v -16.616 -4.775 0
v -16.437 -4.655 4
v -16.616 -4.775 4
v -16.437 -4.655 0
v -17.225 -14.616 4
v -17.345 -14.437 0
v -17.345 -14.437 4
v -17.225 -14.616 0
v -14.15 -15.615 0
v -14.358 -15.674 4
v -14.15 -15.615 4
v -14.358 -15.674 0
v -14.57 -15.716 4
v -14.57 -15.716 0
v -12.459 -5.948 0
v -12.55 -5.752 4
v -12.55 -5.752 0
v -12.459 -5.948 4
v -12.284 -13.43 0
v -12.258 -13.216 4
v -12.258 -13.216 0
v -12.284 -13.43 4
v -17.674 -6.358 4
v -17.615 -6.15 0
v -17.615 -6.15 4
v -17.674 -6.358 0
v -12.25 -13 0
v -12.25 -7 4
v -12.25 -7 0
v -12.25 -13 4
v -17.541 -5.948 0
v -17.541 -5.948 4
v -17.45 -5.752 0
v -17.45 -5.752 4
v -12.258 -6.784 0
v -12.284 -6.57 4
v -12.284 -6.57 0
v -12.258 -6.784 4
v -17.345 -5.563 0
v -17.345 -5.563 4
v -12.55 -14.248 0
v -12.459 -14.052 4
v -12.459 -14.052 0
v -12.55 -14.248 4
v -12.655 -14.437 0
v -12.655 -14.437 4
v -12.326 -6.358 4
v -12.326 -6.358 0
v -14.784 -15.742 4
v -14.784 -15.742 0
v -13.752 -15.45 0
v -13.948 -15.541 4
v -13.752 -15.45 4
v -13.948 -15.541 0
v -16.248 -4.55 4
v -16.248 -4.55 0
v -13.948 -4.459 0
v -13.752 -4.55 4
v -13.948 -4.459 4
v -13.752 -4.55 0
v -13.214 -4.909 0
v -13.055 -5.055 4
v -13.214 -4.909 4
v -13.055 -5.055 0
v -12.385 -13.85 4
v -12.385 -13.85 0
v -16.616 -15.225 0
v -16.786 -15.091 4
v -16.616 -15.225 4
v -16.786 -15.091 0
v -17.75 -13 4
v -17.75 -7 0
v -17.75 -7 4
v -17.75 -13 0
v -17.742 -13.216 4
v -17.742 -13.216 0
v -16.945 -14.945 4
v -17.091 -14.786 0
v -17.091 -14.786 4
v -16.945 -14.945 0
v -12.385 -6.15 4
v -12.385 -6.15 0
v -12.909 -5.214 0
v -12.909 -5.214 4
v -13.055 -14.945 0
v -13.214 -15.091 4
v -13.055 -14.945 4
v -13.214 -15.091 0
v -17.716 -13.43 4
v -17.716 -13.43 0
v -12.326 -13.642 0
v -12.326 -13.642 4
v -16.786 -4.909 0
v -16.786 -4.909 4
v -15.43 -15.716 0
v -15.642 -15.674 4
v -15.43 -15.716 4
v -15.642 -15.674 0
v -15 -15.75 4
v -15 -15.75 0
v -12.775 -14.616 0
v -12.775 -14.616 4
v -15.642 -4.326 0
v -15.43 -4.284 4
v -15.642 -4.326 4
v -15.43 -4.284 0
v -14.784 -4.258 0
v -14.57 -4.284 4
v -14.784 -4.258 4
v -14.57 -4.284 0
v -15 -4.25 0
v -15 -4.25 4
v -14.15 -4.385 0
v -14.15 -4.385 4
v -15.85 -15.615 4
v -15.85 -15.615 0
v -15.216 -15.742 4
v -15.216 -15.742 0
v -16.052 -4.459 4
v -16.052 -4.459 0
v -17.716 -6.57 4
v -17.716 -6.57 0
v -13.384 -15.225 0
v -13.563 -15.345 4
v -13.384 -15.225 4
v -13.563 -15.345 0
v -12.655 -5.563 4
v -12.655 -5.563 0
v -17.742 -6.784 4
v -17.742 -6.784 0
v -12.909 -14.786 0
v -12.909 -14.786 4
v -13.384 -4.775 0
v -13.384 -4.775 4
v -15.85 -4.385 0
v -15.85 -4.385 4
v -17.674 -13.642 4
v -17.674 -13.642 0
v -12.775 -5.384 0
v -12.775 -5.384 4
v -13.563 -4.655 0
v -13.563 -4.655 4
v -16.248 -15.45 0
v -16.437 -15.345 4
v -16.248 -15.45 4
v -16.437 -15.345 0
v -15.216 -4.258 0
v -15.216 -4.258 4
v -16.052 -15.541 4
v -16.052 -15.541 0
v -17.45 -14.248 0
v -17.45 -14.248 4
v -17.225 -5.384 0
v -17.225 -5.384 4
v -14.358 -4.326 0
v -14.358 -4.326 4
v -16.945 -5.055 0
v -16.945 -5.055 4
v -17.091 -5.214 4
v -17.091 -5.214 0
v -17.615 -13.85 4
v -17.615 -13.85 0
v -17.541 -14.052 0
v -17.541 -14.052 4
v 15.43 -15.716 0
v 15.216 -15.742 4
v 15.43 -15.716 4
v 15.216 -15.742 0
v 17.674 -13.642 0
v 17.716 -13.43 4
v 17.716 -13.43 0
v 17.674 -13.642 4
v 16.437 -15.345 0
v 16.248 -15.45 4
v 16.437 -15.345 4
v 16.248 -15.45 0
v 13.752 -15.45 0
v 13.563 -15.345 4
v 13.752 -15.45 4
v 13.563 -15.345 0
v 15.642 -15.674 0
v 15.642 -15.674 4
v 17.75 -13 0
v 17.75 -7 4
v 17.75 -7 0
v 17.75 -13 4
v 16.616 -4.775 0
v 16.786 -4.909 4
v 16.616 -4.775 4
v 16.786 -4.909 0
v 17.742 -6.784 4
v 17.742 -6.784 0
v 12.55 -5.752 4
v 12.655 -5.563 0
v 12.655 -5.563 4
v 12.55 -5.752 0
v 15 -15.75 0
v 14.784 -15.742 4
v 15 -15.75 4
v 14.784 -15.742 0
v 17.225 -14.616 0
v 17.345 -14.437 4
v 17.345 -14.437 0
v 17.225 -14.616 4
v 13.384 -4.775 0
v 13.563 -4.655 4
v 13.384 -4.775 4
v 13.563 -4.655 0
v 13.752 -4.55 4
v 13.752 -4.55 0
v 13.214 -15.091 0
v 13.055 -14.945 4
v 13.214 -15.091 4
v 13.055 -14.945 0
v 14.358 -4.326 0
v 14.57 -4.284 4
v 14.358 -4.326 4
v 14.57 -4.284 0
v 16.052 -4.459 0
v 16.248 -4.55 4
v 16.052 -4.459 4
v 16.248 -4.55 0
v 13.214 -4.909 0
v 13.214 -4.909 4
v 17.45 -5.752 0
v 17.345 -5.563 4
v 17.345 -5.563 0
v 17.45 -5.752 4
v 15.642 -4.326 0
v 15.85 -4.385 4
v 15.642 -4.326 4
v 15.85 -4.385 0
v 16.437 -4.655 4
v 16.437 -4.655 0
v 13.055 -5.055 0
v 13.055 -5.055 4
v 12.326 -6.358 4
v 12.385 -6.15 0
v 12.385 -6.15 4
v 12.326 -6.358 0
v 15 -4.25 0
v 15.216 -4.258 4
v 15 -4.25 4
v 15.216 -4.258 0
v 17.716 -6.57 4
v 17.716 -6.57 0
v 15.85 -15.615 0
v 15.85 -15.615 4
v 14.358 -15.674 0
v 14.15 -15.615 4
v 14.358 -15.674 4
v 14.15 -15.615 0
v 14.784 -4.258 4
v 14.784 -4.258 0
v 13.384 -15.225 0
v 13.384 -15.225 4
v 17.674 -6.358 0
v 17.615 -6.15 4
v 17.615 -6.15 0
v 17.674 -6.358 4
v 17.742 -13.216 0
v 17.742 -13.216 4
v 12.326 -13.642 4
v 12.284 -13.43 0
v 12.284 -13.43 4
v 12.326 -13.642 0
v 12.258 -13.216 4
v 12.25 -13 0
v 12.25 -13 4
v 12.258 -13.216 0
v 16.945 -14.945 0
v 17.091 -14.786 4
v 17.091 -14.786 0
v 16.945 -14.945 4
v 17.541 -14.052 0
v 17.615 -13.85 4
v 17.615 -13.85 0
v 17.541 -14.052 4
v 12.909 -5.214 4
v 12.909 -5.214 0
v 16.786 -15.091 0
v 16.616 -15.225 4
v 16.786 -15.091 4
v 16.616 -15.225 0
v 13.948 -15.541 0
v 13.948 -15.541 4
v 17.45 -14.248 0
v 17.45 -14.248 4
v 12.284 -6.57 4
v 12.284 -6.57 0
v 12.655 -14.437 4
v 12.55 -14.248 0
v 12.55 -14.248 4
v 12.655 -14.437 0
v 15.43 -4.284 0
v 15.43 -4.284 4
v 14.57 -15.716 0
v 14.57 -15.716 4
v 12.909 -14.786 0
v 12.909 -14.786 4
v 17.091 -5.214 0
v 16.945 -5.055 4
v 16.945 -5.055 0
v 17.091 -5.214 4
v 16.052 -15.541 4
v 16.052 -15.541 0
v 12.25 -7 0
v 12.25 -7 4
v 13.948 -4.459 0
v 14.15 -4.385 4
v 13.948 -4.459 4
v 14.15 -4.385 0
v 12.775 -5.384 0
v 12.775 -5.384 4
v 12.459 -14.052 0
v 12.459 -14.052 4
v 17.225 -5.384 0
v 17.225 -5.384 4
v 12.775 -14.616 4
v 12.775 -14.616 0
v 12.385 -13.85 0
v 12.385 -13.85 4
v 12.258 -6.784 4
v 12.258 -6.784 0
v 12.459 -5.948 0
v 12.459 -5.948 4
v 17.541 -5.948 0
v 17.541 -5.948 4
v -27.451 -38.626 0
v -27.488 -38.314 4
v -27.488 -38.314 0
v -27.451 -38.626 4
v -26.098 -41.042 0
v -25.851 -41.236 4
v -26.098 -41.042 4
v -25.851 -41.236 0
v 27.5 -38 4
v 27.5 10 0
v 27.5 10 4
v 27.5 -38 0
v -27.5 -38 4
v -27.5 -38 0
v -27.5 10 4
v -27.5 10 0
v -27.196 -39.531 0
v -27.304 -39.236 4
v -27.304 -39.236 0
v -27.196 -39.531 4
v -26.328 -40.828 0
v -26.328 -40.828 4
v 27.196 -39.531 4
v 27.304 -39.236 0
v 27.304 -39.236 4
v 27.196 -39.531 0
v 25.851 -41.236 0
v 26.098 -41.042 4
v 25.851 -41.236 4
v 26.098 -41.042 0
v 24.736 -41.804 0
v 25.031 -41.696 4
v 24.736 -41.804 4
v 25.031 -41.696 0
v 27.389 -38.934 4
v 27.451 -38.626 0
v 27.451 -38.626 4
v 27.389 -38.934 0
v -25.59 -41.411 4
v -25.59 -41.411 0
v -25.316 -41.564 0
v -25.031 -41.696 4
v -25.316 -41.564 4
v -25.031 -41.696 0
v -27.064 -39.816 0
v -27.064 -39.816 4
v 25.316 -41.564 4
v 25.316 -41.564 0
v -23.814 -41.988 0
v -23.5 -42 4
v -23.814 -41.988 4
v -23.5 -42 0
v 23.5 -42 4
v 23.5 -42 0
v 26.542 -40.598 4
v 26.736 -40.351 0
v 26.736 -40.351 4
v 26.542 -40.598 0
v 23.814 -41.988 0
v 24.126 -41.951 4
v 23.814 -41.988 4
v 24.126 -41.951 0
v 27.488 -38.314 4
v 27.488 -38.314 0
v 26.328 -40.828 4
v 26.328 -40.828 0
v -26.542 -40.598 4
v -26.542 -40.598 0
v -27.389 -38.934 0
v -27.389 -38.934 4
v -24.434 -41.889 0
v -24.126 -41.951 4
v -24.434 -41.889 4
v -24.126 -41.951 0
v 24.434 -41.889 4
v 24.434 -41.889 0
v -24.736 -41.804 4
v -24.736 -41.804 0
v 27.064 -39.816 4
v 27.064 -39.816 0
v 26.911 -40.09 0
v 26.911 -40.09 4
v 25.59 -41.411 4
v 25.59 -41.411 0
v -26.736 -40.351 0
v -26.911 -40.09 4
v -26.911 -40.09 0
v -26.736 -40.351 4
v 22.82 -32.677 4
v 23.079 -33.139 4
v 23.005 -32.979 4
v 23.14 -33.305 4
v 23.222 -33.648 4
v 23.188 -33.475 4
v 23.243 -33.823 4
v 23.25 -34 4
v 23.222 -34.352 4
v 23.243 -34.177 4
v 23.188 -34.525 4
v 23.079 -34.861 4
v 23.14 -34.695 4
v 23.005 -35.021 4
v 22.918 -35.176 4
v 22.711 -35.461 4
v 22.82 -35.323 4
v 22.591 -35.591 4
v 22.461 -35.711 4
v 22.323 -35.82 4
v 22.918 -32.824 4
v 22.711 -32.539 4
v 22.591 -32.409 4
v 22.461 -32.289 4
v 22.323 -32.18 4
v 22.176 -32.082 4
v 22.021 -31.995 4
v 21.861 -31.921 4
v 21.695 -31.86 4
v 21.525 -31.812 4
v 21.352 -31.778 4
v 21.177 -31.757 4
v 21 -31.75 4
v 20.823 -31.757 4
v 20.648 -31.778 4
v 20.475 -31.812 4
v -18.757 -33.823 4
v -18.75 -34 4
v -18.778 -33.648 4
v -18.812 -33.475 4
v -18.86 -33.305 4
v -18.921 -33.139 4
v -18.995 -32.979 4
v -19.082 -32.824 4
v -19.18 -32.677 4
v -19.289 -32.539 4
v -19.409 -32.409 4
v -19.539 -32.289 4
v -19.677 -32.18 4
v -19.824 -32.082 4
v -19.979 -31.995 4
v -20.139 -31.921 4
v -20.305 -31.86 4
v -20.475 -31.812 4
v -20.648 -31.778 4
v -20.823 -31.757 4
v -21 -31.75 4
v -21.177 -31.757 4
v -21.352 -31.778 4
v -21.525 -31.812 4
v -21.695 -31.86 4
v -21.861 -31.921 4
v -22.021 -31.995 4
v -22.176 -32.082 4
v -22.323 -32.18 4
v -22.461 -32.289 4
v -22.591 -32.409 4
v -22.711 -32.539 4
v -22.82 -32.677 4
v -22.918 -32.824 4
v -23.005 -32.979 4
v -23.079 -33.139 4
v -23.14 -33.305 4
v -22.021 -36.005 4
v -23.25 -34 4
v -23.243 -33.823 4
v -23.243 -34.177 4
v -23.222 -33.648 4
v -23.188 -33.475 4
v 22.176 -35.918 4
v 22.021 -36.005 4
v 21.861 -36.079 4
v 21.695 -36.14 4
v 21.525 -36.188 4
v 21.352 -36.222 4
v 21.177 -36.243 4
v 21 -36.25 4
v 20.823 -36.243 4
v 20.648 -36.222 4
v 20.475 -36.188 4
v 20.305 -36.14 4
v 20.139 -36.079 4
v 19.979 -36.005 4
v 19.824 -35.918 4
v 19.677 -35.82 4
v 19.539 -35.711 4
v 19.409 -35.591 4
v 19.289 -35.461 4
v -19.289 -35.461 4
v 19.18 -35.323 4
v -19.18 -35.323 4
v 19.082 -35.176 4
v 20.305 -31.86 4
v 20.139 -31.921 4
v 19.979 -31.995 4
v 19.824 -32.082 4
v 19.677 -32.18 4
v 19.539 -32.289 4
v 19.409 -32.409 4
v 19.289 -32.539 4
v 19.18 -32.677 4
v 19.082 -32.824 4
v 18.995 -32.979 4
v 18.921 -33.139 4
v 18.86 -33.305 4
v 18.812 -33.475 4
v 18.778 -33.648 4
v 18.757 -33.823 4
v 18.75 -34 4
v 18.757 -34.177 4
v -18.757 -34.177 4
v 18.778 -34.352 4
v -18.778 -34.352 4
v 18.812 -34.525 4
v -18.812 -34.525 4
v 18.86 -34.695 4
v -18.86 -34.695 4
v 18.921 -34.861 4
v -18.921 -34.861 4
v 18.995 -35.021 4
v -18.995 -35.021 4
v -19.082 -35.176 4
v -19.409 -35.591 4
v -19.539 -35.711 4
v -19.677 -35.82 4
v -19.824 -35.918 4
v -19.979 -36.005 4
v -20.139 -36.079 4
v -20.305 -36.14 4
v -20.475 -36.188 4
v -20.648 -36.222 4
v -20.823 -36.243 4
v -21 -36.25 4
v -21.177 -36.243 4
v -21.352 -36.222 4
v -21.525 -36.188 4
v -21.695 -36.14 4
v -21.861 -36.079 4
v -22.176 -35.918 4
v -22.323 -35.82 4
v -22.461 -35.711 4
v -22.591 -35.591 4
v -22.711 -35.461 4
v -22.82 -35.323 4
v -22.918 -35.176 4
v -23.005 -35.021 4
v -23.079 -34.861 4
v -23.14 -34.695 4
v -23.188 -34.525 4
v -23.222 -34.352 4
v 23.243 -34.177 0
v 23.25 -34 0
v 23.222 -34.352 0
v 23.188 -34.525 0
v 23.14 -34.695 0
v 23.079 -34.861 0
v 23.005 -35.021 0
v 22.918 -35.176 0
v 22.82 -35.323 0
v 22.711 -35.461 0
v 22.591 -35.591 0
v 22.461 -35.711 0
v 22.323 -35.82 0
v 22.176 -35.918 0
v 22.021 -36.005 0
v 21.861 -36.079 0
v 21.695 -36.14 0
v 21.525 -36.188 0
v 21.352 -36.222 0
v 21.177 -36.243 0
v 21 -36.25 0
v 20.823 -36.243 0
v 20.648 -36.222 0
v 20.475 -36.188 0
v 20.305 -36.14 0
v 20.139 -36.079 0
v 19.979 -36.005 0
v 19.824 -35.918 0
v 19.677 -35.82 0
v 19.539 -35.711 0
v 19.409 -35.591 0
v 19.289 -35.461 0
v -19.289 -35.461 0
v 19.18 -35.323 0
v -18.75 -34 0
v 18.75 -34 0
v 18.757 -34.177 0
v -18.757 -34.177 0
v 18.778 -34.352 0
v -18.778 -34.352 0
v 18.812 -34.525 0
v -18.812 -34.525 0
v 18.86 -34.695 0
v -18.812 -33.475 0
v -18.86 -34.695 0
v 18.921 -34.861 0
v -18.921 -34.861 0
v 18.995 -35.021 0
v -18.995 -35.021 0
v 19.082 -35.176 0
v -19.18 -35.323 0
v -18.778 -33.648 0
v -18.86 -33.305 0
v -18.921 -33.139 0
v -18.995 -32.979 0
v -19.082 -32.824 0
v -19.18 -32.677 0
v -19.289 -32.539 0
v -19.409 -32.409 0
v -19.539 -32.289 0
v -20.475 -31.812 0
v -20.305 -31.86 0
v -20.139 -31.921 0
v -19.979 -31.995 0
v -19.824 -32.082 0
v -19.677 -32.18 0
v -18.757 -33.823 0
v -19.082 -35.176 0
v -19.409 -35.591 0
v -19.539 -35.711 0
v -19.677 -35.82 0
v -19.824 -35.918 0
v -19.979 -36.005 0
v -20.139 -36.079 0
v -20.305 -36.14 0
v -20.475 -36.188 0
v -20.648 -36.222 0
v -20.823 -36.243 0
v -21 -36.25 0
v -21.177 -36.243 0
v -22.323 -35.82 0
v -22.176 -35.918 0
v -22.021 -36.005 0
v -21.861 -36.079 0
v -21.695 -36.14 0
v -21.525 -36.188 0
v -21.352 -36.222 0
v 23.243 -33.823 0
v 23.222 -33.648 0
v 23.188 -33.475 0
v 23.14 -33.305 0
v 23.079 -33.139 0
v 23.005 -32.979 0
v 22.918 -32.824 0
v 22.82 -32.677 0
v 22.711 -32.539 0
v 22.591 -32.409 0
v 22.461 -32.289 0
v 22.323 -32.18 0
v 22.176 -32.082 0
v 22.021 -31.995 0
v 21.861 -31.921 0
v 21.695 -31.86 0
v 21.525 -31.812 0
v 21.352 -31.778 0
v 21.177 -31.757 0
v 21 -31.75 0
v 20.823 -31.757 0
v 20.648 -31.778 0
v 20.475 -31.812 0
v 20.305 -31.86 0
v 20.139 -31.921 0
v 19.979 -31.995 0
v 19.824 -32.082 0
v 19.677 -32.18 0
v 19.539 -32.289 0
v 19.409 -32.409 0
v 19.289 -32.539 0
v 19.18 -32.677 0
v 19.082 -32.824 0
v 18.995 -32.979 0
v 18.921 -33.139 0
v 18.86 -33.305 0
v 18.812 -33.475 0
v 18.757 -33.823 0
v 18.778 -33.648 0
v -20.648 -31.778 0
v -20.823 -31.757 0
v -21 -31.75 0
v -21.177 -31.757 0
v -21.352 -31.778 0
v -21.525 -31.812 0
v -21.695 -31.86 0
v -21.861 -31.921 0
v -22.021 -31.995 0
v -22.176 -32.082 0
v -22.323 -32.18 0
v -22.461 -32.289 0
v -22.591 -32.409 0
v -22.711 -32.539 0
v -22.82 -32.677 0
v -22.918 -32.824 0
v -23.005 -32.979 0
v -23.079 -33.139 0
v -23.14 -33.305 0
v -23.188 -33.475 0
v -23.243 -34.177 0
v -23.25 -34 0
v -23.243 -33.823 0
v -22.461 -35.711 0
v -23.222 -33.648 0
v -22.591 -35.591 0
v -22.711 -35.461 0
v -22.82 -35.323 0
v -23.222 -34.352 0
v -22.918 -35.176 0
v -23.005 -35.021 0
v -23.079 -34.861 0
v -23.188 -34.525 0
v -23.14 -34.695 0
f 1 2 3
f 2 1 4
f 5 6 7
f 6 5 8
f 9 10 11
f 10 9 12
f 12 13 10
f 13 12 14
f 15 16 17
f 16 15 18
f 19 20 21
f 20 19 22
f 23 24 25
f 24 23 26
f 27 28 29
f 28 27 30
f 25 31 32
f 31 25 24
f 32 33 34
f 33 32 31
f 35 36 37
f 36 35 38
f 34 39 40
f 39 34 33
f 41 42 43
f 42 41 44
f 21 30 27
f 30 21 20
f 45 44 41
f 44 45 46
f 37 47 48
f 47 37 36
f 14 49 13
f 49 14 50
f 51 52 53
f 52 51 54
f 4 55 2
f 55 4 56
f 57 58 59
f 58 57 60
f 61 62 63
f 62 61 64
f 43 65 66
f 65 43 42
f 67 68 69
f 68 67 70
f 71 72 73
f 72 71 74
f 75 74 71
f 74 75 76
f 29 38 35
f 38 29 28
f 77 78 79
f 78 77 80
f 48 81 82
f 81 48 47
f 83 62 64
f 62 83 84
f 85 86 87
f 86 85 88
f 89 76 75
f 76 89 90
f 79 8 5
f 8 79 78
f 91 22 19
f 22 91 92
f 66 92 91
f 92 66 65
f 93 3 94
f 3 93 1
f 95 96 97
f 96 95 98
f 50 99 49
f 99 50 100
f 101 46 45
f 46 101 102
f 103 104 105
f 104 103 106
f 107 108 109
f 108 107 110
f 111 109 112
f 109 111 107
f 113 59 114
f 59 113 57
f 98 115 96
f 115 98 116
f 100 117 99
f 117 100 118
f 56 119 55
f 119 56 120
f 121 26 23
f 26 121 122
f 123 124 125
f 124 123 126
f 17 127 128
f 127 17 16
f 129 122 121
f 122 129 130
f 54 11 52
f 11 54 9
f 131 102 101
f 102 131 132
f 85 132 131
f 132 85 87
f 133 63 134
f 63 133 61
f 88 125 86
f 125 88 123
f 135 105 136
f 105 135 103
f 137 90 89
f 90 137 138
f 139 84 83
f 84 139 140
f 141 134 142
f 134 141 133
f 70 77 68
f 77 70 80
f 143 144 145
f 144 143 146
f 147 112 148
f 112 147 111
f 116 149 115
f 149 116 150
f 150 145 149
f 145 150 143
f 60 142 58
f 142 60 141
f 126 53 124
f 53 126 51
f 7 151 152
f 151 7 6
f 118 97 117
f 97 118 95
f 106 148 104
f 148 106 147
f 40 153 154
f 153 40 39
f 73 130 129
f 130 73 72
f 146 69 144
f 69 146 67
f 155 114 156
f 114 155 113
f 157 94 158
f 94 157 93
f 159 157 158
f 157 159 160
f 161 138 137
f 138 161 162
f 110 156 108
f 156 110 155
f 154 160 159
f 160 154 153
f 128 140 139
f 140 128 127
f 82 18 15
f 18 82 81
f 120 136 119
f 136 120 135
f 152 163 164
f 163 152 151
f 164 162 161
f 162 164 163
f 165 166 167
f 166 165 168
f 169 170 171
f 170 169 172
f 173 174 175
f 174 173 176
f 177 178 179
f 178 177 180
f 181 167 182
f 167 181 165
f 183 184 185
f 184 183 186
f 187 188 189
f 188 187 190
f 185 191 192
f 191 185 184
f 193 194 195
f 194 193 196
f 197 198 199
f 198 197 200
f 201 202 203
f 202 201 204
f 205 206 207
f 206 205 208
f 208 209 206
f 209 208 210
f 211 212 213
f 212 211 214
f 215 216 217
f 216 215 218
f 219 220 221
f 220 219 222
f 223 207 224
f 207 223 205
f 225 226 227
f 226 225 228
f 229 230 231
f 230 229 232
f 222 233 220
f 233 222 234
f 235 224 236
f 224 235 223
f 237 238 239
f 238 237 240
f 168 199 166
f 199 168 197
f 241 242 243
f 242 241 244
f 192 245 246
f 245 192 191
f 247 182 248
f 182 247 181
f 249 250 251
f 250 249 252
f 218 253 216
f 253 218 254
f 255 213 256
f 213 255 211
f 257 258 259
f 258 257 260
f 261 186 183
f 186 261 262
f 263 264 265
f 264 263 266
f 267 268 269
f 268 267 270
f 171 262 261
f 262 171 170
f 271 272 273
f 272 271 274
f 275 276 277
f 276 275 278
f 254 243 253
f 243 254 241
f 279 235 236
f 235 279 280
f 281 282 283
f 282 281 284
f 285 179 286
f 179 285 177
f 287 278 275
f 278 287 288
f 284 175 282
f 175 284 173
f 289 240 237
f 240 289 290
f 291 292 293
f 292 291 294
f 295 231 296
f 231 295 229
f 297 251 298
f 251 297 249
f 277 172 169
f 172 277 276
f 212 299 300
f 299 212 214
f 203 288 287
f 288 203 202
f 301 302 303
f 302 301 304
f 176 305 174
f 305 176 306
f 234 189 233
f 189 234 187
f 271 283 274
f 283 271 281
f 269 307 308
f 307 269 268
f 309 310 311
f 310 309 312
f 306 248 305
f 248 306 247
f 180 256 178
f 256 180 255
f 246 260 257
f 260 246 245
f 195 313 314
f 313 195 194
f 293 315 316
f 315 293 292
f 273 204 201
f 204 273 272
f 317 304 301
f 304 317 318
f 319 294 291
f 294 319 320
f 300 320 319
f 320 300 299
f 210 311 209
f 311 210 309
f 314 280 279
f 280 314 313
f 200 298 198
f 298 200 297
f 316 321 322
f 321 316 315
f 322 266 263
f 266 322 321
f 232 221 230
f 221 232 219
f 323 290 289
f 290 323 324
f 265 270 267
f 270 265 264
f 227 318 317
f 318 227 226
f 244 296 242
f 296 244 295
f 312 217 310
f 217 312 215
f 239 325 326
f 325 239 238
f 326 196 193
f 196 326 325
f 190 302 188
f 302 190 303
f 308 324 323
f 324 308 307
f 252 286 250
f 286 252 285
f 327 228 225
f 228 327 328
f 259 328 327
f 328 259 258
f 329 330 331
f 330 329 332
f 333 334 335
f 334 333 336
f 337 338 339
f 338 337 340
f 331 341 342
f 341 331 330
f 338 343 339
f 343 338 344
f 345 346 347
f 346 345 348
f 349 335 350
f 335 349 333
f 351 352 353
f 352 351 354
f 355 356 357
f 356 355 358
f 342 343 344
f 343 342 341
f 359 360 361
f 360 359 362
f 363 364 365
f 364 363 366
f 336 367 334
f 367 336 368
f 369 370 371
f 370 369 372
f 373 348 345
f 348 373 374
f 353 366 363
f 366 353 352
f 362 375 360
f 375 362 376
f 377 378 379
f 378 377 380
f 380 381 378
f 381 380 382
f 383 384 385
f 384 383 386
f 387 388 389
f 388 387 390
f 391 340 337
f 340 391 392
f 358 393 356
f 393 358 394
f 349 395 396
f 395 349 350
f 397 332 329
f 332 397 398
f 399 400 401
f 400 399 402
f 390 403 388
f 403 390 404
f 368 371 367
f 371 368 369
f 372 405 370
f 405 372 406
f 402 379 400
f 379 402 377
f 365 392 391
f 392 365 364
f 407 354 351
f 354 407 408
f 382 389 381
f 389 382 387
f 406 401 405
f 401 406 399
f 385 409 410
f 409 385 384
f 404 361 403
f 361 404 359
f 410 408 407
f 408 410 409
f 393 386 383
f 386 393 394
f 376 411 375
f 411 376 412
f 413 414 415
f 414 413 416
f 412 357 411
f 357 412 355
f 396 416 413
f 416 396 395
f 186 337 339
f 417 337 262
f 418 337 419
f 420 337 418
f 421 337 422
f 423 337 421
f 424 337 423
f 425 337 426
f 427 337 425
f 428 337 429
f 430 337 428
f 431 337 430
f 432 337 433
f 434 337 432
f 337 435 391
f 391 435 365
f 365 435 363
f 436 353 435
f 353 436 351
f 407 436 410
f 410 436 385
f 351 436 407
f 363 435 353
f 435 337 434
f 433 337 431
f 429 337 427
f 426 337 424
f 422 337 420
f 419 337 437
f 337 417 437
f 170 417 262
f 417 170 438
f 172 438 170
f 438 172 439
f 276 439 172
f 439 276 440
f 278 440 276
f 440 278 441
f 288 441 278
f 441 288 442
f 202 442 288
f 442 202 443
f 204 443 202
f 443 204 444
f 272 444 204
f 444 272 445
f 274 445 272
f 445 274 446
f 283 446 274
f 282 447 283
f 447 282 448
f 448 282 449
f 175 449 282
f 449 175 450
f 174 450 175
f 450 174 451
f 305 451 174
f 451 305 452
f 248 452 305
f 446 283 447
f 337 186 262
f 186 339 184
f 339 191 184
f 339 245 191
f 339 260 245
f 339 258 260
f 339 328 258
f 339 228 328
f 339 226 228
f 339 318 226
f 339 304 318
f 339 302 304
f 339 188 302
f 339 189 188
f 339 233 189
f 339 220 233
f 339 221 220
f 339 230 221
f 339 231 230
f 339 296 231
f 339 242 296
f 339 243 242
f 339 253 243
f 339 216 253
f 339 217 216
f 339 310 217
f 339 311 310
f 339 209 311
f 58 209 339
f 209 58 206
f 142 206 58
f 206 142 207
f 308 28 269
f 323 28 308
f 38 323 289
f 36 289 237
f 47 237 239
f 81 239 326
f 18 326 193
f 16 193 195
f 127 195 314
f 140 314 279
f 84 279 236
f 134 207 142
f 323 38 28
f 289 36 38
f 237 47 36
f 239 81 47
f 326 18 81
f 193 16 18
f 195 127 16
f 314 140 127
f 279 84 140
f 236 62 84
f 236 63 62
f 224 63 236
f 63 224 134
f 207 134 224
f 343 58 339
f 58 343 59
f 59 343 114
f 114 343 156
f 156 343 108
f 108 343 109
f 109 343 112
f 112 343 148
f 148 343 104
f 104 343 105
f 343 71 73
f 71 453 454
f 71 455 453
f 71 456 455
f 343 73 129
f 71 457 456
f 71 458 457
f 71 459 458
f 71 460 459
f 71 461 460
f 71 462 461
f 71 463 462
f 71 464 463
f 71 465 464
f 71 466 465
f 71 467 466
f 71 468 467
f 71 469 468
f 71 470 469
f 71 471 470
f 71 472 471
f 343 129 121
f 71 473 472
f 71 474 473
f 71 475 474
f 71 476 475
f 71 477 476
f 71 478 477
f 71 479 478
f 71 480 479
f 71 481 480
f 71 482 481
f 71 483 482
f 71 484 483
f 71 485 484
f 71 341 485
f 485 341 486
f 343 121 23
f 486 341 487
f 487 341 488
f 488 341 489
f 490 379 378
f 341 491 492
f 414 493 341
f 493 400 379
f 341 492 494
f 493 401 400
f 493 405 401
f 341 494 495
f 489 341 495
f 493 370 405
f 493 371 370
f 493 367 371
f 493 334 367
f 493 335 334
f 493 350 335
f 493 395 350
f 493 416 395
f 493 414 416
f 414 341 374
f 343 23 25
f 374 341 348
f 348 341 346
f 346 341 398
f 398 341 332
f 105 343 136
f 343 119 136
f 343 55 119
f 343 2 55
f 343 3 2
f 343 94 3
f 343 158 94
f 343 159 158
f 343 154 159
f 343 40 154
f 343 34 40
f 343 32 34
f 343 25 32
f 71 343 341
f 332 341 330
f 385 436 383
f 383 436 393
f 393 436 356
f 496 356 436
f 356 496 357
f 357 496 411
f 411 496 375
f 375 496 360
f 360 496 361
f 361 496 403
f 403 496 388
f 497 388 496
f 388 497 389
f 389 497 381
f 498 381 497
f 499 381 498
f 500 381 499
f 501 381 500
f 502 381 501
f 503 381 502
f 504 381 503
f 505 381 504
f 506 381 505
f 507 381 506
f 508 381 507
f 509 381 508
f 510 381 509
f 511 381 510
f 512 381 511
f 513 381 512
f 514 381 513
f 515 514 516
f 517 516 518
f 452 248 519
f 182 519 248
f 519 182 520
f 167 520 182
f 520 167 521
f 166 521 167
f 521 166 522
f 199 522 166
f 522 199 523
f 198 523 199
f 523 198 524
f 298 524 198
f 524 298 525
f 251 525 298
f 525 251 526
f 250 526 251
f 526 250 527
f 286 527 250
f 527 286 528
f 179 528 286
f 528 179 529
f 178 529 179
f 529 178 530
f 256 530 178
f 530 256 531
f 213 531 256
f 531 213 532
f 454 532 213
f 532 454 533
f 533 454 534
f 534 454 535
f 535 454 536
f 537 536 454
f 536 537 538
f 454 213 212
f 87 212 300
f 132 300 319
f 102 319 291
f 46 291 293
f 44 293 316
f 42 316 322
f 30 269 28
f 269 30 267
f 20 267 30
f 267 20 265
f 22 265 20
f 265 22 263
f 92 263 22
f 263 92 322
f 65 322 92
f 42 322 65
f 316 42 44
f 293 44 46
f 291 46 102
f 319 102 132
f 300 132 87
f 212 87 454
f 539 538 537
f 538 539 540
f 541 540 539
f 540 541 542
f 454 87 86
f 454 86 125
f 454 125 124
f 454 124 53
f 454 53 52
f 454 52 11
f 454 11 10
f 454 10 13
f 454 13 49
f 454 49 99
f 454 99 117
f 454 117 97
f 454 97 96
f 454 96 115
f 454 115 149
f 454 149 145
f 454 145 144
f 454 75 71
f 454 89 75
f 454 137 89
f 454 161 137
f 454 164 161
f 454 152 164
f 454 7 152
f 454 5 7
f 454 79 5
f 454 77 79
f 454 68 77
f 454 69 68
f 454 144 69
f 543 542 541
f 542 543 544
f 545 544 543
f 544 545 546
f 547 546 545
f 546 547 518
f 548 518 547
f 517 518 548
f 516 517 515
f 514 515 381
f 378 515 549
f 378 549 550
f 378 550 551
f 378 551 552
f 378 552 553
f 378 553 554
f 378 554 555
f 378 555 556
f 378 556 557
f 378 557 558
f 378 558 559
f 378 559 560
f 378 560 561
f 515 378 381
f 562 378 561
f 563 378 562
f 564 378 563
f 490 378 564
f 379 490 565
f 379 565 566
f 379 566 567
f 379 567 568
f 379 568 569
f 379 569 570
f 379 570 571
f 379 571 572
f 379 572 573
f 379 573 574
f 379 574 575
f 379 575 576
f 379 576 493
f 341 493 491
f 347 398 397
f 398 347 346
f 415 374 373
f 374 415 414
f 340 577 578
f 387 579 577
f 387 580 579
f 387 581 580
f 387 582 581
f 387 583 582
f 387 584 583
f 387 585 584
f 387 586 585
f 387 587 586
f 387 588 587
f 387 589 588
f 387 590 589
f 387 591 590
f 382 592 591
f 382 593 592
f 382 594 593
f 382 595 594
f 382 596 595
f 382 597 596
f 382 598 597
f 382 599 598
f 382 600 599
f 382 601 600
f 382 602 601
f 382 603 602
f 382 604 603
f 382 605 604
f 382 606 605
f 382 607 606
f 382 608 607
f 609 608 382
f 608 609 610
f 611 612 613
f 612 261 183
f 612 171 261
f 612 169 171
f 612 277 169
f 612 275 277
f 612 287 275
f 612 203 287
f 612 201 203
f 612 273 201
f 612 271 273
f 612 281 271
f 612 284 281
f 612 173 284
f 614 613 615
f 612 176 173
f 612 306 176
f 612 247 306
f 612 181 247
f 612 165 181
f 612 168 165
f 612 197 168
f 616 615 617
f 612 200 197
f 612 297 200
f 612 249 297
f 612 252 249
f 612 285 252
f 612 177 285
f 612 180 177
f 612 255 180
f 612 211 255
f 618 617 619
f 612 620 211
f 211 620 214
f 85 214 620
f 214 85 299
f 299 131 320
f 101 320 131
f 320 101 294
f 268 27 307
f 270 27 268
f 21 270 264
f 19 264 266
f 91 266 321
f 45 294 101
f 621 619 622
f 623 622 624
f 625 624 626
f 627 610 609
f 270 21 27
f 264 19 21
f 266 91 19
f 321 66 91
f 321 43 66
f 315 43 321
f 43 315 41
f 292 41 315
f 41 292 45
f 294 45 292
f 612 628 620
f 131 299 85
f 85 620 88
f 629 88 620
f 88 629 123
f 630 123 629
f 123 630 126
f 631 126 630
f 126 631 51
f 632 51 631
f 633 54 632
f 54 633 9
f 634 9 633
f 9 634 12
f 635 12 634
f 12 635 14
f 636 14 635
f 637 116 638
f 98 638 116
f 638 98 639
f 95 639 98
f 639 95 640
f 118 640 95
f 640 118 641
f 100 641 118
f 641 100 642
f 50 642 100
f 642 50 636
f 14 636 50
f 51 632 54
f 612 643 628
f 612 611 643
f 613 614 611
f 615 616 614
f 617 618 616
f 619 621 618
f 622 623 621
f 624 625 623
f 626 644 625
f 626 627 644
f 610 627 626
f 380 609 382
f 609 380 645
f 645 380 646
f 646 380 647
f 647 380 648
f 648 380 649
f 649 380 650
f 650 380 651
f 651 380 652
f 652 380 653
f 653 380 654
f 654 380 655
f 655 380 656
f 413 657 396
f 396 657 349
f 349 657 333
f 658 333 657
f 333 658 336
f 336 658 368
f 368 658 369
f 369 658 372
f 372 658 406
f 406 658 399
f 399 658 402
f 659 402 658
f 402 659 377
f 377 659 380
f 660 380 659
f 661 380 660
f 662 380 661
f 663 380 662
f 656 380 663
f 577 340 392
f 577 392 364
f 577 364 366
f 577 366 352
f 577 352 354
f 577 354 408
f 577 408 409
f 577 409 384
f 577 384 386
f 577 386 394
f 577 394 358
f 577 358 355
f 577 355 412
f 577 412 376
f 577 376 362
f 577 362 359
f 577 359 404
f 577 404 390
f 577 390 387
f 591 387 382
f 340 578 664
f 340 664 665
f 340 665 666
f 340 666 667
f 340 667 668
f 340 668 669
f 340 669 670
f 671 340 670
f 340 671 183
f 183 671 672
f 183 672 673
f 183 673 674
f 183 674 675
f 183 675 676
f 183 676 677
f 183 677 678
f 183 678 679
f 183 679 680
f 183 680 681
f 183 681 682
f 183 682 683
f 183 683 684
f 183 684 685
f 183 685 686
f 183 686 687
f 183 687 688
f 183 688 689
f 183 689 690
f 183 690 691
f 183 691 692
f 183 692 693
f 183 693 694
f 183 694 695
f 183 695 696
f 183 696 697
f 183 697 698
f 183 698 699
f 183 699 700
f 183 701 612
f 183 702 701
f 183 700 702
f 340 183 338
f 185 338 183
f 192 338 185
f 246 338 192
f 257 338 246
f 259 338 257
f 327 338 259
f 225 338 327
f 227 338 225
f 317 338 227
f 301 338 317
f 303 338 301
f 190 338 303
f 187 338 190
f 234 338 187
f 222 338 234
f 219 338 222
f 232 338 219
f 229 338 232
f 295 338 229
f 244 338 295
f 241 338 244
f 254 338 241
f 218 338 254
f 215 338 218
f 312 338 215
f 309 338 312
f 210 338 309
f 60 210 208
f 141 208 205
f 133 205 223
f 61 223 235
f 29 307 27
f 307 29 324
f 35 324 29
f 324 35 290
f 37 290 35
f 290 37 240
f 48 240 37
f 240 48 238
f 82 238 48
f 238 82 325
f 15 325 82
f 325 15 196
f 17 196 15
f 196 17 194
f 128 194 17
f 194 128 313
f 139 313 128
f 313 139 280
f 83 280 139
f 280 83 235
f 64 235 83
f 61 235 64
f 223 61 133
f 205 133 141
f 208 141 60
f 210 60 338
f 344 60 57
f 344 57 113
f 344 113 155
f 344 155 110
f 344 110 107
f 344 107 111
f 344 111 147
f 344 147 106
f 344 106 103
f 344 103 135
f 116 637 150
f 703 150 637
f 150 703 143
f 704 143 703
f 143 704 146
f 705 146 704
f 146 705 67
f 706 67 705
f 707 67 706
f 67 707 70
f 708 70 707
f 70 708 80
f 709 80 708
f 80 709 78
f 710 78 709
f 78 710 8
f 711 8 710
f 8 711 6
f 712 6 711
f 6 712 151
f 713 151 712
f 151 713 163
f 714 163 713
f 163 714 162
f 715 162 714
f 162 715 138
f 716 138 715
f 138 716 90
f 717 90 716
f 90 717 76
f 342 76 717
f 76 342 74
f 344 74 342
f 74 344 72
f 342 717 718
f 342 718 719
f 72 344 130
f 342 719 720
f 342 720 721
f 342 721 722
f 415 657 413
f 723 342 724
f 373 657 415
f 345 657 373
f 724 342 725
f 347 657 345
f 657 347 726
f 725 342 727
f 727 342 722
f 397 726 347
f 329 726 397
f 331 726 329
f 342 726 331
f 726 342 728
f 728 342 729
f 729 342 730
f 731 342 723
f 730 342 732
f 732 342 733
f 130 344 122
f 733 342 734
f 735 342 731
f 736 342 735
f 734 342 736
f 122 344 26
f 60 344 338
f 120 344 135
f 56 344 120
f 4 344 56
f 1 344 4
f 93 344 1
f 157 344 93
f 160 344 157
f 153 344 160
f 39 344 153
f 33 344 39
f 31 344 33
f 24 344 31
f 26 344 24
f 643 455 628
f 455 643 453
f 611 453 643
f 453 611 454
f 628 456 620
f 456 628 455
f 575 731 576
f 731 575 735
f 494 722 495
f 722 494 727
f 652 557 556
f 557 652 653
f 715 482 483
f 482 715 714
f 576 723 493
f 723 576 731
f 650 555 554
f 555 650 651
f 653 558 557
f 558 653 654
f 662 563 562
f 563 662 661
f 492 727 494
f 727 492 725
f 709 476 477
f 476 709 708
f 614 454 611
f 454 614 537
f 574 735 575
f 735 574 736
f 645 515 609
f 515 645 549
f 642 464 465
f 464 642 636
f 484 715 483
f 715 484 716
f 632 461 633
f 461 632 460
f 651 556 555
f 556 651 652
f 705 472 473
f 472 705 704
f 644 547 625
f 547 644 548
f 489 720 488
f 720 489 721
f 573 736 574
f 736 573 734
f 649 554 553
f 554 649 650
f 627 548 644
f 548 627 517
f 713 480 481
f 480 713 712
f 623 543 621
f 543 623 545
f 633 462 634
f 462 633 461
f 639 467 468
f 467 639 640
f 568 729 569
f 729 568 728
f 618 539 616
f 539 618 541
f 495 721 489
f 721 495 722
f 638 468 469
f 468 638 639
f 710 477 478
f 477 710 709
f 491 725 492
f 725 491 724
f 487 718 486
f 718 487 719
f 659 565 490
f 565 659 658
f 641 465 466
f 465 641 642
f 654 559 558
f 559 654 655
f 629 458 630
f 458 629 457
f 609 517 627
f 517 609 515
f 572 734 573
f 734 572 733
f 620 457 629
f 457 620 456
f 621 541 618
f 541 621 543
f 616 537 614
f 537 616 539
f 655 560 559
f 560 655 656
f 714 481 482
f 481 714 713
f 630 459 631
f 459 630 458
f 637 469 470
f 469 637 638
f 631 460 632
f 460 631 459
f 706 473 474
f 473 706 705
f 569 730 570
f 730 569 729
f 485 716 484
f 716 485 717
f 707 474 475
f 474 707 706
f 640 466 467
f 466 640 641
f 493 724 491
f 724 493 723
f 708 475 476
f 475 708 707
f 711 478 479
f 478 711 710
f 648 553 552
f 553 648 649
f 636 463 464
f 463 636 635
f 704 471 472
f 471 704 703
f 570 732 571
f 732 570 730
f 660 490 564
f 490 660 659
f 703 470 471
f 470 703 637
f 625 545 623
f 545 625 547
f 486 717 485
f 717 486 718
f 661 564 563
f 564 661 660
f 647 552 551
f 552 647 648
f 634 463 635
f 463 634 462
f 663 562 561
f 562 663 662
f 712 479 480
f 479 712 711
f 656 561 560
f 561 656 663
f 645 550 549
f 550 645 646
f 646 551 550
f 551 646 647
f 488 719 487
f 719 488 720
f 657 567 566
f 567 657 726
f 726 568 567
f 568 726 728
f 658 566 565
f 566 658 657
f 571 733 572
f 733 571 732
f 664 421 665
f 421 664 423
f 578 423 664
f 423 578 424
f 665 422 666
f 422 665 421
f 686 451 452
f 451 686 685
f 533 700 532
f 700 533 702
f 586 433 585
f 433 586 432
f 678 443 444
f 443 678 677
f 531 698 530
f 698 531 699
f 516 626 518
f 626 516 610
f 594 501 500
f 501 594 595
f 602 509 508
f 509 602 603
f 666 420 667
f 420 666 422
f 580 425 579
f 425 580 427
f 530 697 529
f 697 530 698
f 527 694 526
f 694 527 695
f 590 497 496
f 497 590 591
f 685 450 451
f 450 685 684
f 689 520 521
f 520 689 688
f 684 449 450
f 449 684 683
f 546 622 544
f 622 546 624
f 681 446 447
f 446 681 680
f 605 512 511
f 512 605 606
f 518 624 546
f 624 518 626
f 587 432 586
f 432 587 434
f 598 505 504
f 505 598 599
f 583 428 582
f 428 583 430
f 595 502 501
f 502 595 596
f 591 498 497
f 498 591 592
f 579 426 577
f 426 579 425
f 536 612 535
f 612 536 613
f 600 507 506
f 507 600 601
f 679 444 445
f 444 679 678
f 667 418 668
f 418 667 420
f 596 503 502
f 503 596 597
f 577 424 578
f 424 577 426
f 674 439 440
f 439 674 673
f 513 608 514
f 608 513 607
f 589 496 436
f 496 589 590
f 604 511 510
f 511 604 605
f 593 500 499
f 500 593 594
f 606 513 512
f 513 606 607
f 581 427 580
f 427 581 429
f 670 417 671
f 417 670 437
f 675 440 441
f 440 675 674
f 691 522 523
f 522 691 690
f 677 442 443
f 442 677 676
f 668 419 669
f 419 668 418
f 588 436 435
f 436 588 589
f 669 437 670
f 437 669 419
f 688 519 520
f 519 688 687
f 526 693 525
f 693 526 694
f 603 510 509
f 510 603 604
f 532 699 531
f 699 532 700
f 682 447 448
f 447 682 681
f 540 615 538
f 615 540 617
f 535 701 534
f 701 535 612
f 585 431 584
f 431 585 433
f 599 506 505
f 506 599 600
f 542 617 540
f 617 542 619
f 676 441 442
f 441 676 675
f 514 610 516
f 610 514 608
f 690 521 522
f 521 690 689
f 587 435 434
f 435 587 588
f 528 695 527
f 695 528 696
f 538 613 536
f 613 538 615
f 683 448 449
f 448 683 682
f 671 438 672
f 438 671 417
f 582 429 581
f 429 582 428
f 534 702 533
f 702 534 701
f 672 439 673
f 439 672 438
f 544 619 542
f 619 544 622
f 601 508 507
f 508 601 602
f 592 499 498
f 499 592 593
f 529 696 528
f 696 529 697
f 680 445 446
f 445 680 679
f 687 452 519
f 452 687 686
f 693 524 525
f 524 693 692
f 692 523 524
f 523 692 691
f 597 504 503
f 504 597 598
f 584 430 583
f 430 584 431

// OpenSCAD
/*
   =============================================================================
   ADAPTER PLATE: 2020 SIDE-MOUNT TO KP08 BEARING
   Features:
   - Drops shaft centerline below top frame surface for laser optical clearance
   - Vertical tension adjustment slots for the 2020 extrusion frame mounts
   - Structural 4.0mm plate thickness to prevent high-tension belt twist
   =============================================================================
*/

$fn = 80; // Smooth curve resolution

// --- METRIC ARCHITECTURE VARIABLES ---
PLATE_THICKNESS = 4.0;   // Sturdy aluminum/steel plate stock width
PLATE_HEIGHT    = 42.0;  // Total vertical plate drop dimension
PLATE_WIDTH     = 55.0;  // Matches the exact width of the KP08 base span

KP08_HOLE_SPACING = 42.0;  // Center-to-center KP08 holes
KP08_BOLT_DIA     = 4.5;   // Clearance for M4 hardware into the bearing ears
KP08_MOUNT_Y      = 8.0;   // Vertical placement of the bearing flange holes

FRAME_HOLE_SPACING = 30.0; // Spacing for twin 2020 T-slot drops
FRAME_BOLT_DIA     = 5.5;  // Clearance for M5 T-nuts/screws into the 2020 frame
SLOT_LENGTH        = 6.0;  // Length of vertical belt tensioning slots

module side_mount_plate() {
    difference() {
        // 1. Core Solid Backing Plate (With slightly rounded lower corners)
        linear_extrude(height = PLATE_THICKNESS) {
            hull() {
                // Top robust mounting bar
                translate([-PLATE_WIDTH/2, 0]) 
                    square([PLATE_WIDTH, 10]);
                // Left lower rounded corner
                translate([-PLATE_WIDTH/2 + 4, -PLATE_HEIGHT + 4]) 
                    circle(r = 4);
                // Right lower rounded corner
                translate([PLATE_WIDTH/2 - 4, -PLATE_HEIGHT + 4]) 
                    circle(r = 4);
            }
        }
        
        // ==========================================
        // CARVING A: FRAME HARDWARE (2020 MOUNTS)
        // ==========================================
        // Vertical slots allow the plate to slide up/down to tension the Y-axis belt
        for(side = [-1, 1]) {
            translate([side * FRAME_HOLE_SPACING / 2, -10, -1]) {
                hull() {
                    translate([0,  SLOT_LENGTH/2, 0]) cylinder(h = PLATE_THICKNESS + 2, d = FRAME_BOLT_DIA);
                    translate([0, -SLOT_LENGTH/2, 0]) cylinder(h = PLATE_THICKNESS + 2, d = FRAME_BOLT_DIA);
                }
            }
        }
        
        // ==========================================
        // CARVING B: BEARING HARDWARE (KP08 MOUNTS)
        // ==========================================
        // Threaded or pass-through holes to receive your final KP08 base ears
        translate([-KP08_HOLE_SPACING/2, -PLATE_HEIGHT + KP08_MOUNT_Y, -1])
            cylinder(h = PLATE_THICKNESS + 2, d = KP08_BOLT_DIA);
            
        translate([KP08_HOLE_SPACING/2, -PLATE_HEIGHT + KP08_MOUNT_Y, -1])
            cylinder(h = PLATE_THICKNESS + 2, d = KP08_BOLT_DIA);
    }
}

// Render the structural adapter stencil
side_mount_plate();
